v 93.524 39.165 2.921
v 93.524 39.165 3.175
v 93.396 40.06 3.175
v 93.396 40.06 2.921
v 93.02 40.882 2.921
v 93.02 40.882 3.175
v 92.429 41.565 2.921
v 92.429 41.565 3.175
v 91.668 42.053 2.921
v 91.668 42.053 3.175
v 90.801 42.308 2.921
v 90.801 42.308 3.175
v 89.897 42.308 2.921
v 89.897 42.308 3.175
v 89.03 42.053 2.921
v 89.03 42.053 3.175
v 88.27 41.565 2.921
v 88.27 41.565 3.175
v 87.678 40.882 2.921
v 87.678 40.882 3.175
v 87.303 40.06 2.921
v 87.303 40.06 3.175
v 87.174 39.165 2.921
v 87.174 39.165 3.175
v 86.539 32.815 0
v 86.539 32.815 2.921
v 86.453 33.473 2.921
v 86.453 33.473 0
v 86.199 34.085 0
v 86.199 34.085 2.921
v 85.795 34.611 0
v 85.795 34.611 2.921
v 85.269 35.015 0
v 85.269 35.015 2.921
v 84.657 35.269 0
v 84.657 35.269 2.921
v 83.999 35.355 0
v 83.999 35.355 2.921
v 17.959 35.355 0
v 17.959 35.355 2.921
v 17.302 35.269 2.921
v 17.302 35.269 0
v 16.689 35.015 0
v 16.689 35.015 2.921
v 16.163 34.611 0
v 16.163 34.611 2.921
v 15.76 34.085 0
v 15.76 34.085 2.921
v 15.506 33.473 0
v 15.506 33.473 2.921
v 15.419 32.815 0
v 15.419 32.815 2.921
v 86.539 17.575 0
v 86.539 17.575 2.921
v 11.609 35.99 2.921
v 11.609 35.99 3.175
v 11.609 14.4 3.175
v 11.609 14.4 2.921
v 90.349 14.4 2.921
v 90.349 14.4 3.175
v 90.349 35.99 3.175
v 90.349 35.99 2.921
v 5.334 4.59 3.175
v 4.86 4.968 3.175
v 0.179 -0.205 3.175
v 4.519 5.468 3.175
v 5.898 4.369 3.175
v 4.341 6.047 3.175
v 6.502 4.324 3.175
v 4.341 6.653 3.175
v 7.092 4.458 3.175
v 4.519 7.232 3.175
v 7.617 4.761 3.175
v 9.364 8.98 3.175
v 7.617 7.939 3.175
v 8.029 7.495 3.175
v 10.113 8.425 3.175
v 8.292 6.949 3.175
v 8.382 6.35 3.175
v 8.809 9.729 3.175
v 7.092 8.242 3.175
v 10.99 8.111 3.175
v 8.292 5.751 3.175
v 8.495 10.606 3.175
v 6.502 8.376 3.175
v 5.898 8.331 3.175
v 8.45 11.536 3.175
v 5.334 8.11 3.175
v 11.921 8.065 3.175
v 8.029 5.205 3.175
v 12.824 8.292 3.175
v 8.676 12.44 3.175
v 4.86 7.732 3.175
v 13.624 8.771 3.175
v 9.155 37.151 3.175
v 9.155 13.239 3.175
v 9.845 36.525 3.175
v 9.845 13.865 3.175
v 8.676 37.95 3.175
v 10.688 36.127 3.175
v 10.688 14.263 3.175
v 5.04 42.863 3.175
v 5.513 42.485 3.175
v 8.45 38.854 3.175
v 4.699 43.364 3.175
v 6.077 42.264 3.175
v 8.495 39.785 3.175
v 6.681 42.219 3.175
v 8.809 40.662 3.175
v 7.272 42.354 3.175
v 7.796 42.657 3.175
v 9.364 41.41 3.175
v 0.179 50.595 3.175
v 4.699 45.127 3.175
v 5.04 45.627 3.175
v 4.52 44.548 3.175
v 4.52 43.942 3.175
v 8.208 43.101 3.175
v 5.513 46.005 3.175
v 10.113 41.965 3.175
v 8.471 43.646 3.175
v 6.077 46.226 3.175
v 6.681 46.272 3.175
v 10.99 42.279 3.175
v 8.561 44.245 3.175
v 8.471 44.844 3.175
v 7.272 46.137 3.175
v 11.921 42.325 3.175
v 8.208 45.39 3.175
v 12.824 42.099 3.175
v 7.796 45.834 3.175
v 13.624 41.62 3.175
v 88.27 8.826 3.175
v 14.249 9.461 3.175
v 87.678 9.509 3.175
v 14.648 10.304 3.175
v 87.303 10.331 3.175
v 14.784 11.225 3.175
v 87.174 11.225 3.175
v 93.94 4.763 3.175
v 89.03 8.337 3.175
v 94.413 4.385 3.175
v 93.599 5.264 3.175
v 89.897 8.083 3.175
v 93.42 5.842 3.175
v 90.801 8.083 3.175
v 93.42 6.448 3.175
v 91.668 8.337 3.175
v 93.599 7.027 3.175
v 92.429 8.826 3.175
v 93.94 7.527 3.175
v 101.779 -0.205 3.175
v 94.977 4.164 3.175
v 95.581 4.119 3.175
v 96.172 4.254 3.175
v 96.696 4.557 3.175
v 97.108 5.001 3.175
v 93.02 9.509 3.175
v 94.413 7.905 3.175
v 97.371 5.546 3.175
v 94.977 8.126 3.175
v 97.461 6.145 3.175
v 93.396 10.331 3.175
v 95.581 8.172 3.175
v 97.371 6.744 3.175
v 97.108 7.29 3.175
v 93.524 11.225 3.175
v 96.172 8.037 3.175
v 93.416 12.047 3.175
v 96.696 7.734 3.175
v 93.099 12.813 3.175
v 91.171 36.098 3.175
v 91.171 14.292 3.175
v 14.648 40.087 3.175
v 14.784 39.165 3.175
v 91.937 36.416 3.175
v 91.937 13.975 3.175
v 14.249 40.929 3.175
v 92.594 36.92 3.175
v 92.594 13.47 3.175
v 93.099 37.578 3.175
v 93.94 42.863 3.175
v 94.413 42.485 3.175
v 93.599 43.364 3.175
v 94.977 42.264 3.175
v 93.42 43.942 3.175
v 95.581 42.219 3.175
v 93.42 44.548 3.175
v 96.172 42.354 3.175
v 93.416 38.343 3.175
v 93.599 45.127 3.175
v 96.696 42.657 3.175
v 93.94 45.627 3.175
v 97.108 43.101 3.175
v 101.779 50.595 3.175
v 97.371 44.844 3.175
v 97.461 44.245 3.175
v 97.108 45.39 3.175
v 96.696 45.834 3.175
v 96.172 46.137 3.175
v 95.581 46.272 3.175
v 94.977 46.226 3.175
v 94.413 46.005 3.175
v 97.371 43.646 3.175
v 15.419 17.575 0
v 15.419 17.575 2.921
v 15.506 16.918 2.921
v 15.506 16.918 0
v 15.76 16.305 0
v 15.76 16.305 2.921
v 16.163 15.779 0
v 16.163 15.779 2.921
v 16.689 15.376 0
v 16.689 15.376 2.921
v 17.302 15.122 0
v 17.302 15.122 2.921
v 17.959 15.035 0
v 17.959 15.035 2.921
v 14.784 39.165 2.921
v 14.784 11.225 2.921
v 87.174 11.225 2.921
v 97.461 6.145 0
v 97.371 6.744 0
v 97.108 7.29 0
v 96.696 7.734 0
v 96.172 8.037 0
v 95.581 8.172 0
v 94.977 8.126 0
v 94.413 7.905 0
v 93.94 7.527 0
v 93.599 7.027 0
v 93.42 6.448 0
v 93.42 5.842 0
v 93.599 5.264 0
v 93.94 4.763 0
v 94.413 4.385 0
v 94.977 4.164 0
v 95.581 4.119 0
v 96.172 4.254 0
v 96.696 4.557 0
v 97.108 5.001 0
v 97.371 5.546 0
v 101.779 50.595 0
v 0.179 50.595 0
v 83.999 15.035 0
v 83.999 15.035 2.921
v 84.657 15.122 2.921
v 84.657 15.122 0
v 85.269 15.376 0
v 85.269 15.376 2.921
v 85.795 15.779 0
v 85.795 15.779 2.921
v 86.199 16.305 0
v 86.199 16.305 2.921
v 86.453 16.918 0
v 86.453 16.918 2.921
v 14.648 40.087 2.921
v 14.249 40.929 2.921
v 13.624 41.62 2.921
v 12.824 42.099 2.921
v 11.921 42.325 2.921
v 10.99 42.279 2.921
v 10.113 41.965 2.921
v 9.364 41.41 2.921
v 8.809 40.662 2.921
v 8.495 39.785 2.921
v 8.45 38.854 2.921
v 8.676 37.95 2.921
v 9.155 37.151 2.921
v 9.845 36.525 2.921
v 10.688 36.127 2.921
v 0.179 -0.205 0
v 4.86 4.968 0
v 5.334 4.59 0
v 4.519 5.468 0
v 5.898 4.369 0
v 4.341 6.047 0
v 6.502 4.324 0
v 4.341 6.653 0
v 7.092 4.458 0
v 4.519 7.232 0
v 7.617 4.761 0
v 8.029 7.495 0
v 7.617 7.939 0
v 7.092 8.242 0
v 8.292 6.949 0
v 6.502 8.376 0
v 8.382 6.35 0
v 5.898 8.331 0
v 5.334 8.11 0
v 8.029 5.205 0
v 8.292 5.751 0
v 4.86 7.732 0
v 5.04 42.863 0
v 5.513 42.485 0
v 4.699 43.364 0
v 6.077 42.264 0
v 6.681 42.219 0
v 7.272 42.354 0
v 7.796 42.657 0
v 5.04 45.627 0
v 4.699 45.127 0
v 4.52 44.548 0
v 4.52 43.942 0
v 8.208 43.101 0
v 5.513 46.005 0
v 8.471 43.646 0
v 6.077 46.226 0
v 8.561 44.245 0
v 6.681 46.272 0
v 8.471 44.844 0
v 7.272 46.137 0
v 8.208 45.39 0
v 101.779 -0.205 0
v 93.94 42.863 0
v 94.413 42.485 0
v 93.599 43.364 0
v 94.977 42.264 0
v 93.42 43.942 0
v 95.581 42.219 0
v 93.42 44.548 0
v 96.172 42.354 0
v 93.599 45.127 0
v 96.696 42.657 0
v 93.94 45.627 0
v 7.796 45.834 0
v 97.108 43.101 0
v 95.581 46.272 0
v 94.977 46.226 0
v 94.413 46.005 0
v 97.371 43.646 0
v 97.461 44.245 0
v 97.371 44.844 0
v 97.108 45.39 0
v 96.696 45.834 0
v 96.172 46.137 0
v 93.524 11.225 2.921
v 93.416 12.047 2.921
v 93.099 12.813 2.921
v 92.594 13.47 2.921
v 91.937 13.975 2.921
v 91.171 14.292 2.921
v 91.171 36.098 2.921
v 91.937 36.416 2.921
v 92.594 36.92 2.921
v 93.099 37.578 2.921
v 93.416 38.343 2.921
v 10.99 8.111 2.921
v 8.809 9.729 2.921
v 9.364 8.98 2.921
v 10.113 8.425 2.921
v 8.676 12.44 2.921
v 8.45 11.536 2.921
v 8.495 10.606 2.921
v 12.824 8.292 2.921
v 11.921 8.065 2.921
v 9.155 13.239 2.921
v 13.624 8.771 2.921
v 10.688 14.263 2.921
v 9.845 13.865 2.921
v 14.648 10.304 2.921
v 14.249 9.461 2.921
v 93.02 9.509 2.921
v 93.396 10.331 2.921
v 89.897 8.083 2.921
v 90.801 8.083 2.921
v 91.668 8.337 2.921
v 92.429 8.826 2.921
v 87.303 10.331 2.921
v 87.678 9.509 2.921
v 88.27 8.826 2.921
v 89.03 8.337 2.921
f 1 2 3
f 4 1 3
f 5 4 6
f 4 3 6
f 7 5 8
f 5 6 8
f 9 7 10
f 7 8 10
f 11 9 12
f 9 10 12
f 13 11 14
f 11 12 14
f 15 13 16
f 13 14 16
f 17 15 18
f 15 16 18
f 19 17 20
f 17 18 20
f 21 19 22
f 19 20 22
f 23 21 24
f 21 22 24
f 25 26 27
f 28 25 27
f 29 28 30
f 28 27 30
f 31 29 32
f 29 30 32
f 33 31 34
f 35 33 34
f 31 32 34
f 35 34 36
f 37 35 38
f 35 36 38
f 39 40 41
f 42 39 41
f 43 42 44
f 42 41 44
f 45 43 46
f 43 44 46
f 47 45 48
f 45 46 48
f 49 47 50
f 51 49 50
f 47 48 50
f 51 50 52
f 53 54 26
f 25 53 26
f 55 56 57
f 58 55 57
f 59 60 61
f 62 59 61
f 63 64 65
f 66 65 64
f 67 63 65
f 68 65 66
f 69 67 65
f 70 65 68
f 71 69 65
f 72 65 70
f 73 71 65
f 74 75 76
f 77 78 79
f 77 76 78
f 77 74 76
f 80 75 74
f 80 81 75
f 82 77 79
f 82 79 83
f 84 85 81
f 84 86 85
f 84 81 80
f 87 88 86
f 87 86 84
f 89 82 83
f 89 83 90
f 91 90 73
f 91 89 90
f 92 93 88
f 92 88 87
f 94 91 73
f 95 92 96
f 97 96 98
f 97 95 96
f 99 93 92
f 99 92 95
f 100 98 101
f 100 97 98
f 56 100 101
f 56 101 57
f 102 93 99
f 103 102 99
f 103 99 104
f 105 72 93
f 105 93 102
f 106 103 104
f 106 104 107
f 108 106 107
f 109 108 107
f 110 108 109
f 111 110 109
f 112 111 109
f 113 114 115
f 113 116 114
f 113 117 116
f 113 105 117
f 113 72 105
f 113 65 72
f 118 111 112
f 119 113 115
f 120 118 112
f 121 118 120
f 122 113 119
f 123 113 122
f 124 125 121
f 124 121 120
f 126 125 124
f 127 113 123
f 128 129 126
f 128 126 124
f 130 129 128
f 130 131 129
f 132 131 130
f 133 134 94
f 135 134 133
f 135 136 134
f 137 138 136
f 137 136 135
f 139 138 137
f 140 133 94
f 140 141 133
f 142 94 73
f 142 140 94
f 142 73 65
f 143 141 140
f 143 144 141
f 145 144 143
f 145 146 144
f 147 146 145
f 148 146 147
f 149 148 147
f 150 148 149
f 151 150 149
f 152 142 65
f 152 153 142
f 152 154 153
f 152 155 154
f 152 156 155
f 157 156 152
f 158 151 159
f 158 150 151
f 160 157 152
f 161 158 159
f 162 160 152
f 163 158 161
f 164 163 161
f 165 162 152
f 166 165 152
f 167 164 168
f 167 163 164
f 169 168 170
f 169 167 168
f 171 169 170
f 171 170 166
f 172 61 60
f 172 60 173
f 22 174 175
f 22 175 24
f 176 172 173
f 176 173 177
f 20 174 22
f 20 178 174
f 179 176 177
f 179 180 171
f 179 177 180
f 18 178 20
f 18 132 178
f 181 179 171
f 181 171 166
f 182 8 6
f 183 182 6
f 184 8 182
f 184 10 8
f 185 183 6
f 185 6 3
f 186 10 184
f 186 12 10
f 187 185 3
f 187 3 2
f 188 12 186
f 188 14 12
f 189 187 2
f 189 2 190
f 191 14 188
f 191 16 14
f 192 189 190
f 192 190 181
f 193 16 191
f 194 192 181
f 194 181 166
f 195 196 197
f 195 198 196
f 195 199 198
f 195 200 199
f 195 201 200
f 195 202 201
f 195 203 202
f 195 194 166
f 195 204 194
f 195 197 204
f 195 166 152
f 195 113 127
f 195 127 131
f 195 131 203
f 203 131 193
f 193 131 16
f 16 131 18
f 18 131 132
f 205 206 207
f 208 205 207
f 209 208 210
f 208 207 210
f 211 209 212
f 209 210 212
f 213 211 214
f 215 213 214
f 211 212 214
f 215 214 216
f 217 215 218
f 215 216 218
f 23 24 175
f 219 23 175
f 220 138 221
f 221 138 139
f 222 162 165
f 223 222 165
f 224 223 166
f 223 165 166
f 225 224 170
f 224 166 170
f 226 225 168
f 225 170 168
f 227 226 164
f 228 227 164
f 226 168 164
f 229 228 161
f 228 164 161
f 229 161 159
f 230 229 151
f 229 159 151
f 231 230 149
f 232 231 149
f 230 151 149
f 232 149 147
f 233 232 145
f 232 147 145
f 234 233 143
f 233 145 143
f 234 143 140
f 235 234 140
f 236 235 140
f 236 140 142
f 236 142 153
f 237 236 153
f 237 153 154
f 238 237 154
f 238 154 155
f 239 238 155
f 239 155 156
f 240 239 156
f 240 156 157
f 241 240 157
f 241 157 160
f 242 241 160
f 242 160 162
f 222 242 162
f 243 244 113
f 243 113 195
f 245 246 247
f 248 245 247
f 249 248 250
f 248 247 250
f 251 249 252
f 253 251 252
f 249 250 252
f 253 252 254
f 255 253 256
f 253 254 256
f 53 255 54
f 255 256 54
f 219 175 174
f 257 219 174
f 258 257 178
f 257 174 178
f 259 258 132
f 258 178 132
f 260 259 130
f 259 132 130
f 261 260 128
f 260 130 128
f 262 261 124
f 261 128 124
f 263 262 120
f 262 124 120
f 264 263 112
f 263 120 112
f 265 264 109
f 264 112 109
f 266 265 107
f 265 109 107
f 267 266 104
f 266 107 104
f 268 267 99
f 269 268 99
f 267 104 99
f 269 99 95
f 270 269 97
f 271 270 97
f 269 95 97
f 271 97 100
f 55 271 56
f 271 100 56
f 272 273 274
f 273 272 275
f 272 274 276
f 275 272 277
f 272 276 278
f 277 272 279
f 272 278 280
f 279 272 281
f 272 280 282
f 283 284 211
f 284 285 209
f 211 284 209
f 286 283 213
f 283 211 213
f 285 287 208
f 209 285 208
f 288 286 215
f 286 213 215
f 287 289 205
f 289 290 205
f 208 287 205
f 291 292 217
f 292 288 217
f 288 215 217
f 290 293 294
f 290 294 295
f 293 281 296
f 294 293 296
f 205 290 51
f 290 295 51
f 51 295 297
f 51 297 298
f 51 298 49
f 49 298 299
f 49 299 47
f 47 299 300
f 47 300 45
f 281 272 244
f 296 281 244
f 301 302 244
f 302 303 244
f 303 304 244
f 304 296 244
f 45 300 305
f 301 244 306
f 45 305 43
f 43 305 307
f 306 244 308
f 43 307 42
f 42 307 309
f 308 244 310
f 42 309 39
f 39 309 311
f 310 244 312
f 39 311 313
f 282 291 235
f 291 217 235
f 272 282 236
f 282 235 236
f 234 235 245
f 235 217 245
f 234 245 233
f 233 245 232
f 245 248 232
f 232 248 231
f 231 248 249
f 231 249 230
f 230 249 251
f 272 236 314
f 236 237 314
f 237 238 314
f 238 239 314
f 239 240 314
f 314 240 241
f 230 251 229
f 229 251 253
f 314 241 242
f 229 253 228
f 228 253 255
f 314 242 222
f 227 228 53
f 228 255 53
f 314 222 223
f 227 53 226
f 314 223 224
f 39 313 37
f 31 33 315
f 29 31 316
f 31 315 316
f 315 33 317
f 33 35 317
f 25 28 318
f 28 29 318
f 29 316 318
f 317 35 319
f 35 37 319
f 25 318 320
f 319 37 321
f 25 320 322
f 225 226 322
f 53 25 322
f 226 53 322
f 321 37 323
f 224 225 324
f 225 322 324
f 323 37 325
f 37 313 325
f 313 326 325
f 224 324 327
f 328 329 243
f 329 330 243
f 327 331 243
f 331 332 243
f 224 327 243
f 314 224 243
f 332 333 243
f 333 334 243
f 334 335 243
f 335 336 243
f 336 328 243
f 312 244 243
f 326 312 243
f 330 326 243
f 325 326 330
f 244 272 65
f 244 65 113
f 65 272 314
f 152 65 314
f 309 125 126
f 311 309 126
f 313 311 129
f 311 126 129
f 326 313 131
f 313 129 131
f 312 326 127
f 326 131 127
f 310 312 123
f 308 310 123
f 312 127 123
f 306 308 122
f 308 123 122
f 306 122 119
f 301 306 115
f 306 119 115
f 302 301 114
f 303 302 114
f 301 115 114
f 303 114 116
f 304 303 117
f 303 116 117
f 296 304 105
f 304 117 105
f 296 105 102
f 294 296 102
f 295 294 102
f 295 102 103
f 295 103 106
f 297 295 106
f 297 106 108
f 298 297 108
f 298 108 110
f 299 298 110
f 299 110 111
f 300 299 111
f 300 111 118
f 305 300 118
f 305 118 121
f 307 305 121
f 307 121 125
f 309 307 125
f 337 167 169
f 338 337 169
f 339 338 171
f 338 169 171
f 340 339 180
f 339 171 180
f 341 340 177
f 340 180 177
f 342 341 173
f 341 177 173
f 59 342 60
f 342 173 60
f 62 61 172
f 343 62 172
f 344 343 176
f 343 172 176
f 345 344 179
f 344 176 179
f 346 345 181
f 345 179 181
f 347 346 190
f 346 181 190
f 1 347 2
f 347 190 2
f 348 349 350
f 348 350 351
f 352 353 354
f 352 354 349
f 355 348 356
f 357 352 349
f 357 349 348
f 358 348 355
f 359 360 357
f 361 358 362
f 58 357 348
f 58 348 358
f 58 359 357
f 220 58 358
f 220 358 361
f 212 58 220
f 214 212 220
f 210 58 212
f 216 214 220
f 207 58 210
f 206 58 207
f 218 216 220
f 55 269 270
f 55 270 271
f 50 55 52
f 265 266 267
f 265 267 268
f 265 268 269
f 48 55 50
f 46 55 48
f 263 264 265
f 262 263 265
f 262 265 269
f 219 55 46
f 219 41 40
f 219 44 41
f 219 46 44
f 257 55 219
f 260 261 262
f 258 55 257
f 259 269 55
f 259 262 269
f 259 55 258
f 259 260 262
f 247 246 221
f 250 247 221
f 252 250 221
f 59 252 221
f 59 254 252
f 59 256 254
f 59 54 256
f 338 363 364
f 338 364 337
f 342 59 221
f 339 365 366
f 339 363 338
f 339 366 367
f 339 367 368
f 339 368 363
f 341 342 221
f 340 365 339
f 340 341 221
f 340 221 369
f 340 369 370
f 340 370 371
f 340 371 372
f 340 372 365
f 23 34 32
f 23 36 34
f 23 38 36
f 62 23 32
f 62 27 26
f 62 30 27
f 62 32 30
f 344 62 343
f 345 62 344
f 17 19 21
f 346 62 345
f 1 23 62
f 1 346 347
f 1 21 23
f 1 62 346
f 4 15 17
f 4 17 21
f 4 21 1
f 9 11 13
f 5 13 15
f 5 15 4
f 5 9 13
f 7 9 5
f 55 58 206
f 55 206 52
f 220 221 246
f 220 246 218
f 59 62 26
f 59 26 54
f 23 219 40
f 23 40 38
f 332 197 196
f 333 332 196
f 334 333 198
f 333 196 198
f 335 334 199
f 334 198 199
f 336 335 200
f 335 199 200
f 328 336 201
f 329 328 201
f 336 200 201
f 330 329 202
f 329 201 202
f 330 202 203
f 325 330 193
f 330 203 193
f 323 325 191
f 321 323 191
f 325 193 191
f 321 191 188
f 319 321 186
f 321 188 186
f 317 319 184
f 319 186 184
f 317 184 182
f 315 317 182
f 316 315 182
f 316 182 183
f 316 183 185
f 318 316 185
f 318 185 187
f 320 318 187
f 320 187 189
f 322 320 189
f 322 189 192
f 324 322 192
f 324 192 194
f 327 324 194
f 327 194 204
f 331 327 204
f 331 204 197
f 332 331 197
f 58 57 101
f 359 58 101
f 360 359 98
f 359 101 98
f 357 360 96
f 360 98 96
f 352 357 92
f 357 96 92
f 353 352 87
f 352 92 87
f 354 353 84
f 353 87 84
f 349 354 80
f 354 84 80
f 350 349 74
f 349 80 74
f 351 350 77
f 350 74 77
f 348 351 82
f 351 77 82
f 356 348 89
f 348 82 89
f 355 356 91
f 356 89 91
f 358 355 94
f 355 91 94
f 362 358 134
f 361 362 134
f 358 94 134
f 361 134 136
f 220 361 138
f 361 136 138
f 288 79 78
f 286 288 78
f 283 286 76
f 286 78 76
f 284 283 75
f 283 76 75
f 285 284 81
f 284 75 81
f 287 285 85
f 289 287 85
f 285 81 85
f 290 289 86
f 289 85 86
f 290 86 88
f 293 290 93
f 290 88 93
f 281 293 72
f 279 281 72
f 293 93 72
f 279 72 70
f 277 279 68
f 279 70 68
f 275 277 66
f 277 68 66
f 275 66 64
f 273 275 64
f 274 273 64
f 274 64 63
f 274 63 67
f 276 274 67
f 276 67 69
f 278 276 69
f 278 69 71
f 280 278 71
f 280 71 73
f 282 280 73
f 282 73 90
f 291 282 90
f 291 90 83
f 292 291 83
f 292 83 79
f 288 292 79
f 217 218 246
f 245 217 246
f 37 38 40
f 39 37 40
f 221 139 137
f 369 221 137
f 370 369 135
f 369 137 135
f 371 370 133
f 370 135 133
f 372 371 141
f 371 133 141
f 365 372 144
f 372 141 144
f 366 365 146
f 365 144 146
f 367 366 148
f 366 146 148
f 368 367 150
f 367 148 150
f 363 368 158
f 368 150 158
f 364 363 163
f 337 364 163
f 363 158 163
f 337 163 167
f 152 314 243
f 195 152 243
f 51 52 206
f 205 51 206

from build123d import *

# Parameters (mm, degrees)
F0_W          = 101.6
F0_H          = 50.8
F1_DEPTH      = 3.175
F3_DEPTH      = 0.254
F5_DEPTH      = 25.4
F5_DEPTH_BACK = 25.4
F6_R          = 2.032
F7_DEPTH      = 25.4
F7_DEPTH_BACK = 25.4


with BuildPart() as f1:
    # F0 (on Top) → F1 (new body)
    with BuildSketch(Plane.XY):
        with Locations((50.9793485571, 25.1952067787)):
            Rectangle(F0_W, F0_H)
    extrude(amount=F1_DEPTH)

    # F2 (on face) → F3 (cut)
    with BuildSketch(Plane.XY.offset(3.175)):
        with BuildLine():
            Line((11.6093485571, 35.9902067787), (11.6093485571, 39.1652067787))
            Line((11.6093485571, 39.1652067787), (14.7843485571, 39.1652067787))
            ThreePointArc((14.7843485571, 39.1652067787), (9.3642845268, 41.4102708089), (11.6093485571, 35.9902067787))
        make_face()
        with BuildLine():
            Line((14.7843485571, 39.1652067787), (11.6093485571, 39.1652067787))
            Line((11.6093485571, 39.1652067787), (11.6093485571, 35.9902067787))
            ThreePointArc((11.6093485571, 35.9902067787), (13.8544125874, 36.9201427484), (14.7843485571, 39.1652067787))
        make_face()
        with BuildLine():
            ThreePointArc((14.7843485571, 11.2252067787), (13.8544125874, 13.4702708089), (11.6093485571, 14.4002067787))
            Line((11.6093485571, 14.4002067787), (11.6093485571, 11.2252067787))
            Line((11.6093485571, 11.2252067787), (14.7843485571, 11.2252067787))
        make_face()
        with BuildLine():
            Line((11.6093485571, 11.2252067787), (11.6093485571, 14.4002067787))
            ThreePointArc((11.6093485571, 14.4002067787), (9.3642845268, 8.9801427484), (14.7843485571, 11.2252067787))
            Line((14.7843485571, 11.2252067787), (11.6093485571, 11.2252067787))
        make_face()
        with BuildLine():
            Line((90.3493485571, 11.2252067787), (90.3493485571, 14.4002067787))
            ThreePointArc((90.3493485571, 14.4002067787), (88.1042845268, 13.4702708089), (87.1743485571, 11.2252067787))
            Line((87.1743485571, 11.2252067787), (90.3493485571, 11.2252067787))
        make_face()
        with BuildLine():
            ThreePointArc((93.5243485571, 11.2252067787), (92.5944125874, 13.4702708089), (90.3493485571, 14.4002067787))
            Line((90.3493485571, 14.4002067787), (90.3493485571, 11.2252067787))
            Line((90.3493485571, 11.2252067787), (87.1743485571, 11.2252067787))
            ThreePointArc((87.1743485571, 11.2252067787), (90.3493485571, 8.0502067787), (93.5243485571, 11.2252067787))
        make_face()
        with BuildLine():
            ThreePointArc((93.5243485571, 39.1652067787), (90.3493485571, 42.3402067787), (87.1743485571, 39.1652067787))
            Line((87.1743485571, 39.1652067787), (90.3493485571, 39.1652067787))
            Line((90.3493485571, 39.1652067787), (90.3493485571, 35.9902067787))
            ThreePointArc((90.3493485571, 35.9902067787), (92.5944125874, 36.9201427484), (93.5243485571, 39.1652067787))
        make_face()
        with BuildLine():
            Line((90.3493485571, 39.1652067787), (87.1743485571, 39.1652067787))
            ThreePointArc((87.1743485571, 39.1652067787), (88.1042845268, 36.9201427484), (90.3493485571, 35.9902067787))
            Line((90.3493485571, 35.9902067787), (90.3493485571, 39.1652067787))
        make_face()
        with BuildLine():
            Line((87.1743485571, 39.1652067787), (14.7843485571, 39.1652067787))
            ThreePointArc((14.7843485571, 39.1652067787), (13.8544125874, 36.9201427484), (11.6093485571, 35.9902067787))
            Line((11.6093485571, 35.9902067787), (11.6093485571, 14.4002067787))
            ThreePointArc((11.6093485571, 14.4002067787), (13.8544125874, 13.4702708089), (14.7843485571, 11.2252067787))
            Line((14.7843485571, 11.2252067787), (87.1743485571, 11.2252067787))
            ThreePointArc((87.1743485571, 11.2252067787), (88.1042845268, 13.4702708089), (90.3493485571, 14.4002067787))
            Line((90.3493485571, 14.4002067787), (90.3493485571, 35.9902067787))
            ThreePointArc((90.3493485571, 35.9902067787), (88.1042845268, 36.9201427484), (87.1743485571, 39.1652067787))
        make_face()
    extrude(amount=-F3_DEPTH, mode=Mode.SUBTRACT)

    # F4 (on face) → F5 (cut, two sides)
    with BuildSketch(Plane.XY.offset(2.921)) as f5_sk:
        with BuildLine():
            ThreePointArc((15.4193485571, 17.5752067787), (16.1632973329, 15.7791555545), (17.9593485571, 15.0352067787))
            Line((17.9593485571, 15.0352067787), (83.9993485571, 15.0352067787))
            ThreePointArc((83.9993485571, 15.0352067787), (85.7953997813, 15.7791555545), (86.5393485571, 17.5752067787))
            Line((86.5393485571, 17.5752067787), (86.5393485571, 32.8152067787))
            ThreePointArc((86.5393485571, 32.8152067787), (85.7953997813, 34.6112580029), (83.9993485571, 35.3552067787))
            Line((83.9993485571, 35.3552067787), (17.9593485571, 35.3552067787))
            ThreePointArc((17.9593485571, 35.3552067787), (16.1632973329, 34.6112580029), (15.4193485571, 32.8152067787))
            Line((15.4193485571, 32.8152067787), (15.4193485571, 17.5752067787))
        make_face()
    extrude(amount=-F5_DEPTH, mode=Mode.SUBTRACT)
    extrude(f5_sk.sketch, amount=F5_DEPTH_BACK, mode=Mode.SUBTRACT)

    # F6 (on face) → F7 (cut, two sides)
    with BuildSketch(Plane.XY.offset(3.175)) as f7_sk:
        with Locations((6.5293485571, 44.2452067787)):
            Circle(F6_R)
        with Locations((95.4293485571, 44.2452067787)):
            Circle(F6_R)
        with Locations((95.4293485571, 6.1452067787)):
            Circle(F6_R)
        with Locations((6.35, 6.35)):
            Circle(F6_R)
    extrude(amount=-F7_DEPTH, mode=Mode.SUBTRACT)
    extrude(f7_sk.sketch, amount=F7_DEPTH_BACK, mode=Mode.SUBTRACT)


solid = f1.part
